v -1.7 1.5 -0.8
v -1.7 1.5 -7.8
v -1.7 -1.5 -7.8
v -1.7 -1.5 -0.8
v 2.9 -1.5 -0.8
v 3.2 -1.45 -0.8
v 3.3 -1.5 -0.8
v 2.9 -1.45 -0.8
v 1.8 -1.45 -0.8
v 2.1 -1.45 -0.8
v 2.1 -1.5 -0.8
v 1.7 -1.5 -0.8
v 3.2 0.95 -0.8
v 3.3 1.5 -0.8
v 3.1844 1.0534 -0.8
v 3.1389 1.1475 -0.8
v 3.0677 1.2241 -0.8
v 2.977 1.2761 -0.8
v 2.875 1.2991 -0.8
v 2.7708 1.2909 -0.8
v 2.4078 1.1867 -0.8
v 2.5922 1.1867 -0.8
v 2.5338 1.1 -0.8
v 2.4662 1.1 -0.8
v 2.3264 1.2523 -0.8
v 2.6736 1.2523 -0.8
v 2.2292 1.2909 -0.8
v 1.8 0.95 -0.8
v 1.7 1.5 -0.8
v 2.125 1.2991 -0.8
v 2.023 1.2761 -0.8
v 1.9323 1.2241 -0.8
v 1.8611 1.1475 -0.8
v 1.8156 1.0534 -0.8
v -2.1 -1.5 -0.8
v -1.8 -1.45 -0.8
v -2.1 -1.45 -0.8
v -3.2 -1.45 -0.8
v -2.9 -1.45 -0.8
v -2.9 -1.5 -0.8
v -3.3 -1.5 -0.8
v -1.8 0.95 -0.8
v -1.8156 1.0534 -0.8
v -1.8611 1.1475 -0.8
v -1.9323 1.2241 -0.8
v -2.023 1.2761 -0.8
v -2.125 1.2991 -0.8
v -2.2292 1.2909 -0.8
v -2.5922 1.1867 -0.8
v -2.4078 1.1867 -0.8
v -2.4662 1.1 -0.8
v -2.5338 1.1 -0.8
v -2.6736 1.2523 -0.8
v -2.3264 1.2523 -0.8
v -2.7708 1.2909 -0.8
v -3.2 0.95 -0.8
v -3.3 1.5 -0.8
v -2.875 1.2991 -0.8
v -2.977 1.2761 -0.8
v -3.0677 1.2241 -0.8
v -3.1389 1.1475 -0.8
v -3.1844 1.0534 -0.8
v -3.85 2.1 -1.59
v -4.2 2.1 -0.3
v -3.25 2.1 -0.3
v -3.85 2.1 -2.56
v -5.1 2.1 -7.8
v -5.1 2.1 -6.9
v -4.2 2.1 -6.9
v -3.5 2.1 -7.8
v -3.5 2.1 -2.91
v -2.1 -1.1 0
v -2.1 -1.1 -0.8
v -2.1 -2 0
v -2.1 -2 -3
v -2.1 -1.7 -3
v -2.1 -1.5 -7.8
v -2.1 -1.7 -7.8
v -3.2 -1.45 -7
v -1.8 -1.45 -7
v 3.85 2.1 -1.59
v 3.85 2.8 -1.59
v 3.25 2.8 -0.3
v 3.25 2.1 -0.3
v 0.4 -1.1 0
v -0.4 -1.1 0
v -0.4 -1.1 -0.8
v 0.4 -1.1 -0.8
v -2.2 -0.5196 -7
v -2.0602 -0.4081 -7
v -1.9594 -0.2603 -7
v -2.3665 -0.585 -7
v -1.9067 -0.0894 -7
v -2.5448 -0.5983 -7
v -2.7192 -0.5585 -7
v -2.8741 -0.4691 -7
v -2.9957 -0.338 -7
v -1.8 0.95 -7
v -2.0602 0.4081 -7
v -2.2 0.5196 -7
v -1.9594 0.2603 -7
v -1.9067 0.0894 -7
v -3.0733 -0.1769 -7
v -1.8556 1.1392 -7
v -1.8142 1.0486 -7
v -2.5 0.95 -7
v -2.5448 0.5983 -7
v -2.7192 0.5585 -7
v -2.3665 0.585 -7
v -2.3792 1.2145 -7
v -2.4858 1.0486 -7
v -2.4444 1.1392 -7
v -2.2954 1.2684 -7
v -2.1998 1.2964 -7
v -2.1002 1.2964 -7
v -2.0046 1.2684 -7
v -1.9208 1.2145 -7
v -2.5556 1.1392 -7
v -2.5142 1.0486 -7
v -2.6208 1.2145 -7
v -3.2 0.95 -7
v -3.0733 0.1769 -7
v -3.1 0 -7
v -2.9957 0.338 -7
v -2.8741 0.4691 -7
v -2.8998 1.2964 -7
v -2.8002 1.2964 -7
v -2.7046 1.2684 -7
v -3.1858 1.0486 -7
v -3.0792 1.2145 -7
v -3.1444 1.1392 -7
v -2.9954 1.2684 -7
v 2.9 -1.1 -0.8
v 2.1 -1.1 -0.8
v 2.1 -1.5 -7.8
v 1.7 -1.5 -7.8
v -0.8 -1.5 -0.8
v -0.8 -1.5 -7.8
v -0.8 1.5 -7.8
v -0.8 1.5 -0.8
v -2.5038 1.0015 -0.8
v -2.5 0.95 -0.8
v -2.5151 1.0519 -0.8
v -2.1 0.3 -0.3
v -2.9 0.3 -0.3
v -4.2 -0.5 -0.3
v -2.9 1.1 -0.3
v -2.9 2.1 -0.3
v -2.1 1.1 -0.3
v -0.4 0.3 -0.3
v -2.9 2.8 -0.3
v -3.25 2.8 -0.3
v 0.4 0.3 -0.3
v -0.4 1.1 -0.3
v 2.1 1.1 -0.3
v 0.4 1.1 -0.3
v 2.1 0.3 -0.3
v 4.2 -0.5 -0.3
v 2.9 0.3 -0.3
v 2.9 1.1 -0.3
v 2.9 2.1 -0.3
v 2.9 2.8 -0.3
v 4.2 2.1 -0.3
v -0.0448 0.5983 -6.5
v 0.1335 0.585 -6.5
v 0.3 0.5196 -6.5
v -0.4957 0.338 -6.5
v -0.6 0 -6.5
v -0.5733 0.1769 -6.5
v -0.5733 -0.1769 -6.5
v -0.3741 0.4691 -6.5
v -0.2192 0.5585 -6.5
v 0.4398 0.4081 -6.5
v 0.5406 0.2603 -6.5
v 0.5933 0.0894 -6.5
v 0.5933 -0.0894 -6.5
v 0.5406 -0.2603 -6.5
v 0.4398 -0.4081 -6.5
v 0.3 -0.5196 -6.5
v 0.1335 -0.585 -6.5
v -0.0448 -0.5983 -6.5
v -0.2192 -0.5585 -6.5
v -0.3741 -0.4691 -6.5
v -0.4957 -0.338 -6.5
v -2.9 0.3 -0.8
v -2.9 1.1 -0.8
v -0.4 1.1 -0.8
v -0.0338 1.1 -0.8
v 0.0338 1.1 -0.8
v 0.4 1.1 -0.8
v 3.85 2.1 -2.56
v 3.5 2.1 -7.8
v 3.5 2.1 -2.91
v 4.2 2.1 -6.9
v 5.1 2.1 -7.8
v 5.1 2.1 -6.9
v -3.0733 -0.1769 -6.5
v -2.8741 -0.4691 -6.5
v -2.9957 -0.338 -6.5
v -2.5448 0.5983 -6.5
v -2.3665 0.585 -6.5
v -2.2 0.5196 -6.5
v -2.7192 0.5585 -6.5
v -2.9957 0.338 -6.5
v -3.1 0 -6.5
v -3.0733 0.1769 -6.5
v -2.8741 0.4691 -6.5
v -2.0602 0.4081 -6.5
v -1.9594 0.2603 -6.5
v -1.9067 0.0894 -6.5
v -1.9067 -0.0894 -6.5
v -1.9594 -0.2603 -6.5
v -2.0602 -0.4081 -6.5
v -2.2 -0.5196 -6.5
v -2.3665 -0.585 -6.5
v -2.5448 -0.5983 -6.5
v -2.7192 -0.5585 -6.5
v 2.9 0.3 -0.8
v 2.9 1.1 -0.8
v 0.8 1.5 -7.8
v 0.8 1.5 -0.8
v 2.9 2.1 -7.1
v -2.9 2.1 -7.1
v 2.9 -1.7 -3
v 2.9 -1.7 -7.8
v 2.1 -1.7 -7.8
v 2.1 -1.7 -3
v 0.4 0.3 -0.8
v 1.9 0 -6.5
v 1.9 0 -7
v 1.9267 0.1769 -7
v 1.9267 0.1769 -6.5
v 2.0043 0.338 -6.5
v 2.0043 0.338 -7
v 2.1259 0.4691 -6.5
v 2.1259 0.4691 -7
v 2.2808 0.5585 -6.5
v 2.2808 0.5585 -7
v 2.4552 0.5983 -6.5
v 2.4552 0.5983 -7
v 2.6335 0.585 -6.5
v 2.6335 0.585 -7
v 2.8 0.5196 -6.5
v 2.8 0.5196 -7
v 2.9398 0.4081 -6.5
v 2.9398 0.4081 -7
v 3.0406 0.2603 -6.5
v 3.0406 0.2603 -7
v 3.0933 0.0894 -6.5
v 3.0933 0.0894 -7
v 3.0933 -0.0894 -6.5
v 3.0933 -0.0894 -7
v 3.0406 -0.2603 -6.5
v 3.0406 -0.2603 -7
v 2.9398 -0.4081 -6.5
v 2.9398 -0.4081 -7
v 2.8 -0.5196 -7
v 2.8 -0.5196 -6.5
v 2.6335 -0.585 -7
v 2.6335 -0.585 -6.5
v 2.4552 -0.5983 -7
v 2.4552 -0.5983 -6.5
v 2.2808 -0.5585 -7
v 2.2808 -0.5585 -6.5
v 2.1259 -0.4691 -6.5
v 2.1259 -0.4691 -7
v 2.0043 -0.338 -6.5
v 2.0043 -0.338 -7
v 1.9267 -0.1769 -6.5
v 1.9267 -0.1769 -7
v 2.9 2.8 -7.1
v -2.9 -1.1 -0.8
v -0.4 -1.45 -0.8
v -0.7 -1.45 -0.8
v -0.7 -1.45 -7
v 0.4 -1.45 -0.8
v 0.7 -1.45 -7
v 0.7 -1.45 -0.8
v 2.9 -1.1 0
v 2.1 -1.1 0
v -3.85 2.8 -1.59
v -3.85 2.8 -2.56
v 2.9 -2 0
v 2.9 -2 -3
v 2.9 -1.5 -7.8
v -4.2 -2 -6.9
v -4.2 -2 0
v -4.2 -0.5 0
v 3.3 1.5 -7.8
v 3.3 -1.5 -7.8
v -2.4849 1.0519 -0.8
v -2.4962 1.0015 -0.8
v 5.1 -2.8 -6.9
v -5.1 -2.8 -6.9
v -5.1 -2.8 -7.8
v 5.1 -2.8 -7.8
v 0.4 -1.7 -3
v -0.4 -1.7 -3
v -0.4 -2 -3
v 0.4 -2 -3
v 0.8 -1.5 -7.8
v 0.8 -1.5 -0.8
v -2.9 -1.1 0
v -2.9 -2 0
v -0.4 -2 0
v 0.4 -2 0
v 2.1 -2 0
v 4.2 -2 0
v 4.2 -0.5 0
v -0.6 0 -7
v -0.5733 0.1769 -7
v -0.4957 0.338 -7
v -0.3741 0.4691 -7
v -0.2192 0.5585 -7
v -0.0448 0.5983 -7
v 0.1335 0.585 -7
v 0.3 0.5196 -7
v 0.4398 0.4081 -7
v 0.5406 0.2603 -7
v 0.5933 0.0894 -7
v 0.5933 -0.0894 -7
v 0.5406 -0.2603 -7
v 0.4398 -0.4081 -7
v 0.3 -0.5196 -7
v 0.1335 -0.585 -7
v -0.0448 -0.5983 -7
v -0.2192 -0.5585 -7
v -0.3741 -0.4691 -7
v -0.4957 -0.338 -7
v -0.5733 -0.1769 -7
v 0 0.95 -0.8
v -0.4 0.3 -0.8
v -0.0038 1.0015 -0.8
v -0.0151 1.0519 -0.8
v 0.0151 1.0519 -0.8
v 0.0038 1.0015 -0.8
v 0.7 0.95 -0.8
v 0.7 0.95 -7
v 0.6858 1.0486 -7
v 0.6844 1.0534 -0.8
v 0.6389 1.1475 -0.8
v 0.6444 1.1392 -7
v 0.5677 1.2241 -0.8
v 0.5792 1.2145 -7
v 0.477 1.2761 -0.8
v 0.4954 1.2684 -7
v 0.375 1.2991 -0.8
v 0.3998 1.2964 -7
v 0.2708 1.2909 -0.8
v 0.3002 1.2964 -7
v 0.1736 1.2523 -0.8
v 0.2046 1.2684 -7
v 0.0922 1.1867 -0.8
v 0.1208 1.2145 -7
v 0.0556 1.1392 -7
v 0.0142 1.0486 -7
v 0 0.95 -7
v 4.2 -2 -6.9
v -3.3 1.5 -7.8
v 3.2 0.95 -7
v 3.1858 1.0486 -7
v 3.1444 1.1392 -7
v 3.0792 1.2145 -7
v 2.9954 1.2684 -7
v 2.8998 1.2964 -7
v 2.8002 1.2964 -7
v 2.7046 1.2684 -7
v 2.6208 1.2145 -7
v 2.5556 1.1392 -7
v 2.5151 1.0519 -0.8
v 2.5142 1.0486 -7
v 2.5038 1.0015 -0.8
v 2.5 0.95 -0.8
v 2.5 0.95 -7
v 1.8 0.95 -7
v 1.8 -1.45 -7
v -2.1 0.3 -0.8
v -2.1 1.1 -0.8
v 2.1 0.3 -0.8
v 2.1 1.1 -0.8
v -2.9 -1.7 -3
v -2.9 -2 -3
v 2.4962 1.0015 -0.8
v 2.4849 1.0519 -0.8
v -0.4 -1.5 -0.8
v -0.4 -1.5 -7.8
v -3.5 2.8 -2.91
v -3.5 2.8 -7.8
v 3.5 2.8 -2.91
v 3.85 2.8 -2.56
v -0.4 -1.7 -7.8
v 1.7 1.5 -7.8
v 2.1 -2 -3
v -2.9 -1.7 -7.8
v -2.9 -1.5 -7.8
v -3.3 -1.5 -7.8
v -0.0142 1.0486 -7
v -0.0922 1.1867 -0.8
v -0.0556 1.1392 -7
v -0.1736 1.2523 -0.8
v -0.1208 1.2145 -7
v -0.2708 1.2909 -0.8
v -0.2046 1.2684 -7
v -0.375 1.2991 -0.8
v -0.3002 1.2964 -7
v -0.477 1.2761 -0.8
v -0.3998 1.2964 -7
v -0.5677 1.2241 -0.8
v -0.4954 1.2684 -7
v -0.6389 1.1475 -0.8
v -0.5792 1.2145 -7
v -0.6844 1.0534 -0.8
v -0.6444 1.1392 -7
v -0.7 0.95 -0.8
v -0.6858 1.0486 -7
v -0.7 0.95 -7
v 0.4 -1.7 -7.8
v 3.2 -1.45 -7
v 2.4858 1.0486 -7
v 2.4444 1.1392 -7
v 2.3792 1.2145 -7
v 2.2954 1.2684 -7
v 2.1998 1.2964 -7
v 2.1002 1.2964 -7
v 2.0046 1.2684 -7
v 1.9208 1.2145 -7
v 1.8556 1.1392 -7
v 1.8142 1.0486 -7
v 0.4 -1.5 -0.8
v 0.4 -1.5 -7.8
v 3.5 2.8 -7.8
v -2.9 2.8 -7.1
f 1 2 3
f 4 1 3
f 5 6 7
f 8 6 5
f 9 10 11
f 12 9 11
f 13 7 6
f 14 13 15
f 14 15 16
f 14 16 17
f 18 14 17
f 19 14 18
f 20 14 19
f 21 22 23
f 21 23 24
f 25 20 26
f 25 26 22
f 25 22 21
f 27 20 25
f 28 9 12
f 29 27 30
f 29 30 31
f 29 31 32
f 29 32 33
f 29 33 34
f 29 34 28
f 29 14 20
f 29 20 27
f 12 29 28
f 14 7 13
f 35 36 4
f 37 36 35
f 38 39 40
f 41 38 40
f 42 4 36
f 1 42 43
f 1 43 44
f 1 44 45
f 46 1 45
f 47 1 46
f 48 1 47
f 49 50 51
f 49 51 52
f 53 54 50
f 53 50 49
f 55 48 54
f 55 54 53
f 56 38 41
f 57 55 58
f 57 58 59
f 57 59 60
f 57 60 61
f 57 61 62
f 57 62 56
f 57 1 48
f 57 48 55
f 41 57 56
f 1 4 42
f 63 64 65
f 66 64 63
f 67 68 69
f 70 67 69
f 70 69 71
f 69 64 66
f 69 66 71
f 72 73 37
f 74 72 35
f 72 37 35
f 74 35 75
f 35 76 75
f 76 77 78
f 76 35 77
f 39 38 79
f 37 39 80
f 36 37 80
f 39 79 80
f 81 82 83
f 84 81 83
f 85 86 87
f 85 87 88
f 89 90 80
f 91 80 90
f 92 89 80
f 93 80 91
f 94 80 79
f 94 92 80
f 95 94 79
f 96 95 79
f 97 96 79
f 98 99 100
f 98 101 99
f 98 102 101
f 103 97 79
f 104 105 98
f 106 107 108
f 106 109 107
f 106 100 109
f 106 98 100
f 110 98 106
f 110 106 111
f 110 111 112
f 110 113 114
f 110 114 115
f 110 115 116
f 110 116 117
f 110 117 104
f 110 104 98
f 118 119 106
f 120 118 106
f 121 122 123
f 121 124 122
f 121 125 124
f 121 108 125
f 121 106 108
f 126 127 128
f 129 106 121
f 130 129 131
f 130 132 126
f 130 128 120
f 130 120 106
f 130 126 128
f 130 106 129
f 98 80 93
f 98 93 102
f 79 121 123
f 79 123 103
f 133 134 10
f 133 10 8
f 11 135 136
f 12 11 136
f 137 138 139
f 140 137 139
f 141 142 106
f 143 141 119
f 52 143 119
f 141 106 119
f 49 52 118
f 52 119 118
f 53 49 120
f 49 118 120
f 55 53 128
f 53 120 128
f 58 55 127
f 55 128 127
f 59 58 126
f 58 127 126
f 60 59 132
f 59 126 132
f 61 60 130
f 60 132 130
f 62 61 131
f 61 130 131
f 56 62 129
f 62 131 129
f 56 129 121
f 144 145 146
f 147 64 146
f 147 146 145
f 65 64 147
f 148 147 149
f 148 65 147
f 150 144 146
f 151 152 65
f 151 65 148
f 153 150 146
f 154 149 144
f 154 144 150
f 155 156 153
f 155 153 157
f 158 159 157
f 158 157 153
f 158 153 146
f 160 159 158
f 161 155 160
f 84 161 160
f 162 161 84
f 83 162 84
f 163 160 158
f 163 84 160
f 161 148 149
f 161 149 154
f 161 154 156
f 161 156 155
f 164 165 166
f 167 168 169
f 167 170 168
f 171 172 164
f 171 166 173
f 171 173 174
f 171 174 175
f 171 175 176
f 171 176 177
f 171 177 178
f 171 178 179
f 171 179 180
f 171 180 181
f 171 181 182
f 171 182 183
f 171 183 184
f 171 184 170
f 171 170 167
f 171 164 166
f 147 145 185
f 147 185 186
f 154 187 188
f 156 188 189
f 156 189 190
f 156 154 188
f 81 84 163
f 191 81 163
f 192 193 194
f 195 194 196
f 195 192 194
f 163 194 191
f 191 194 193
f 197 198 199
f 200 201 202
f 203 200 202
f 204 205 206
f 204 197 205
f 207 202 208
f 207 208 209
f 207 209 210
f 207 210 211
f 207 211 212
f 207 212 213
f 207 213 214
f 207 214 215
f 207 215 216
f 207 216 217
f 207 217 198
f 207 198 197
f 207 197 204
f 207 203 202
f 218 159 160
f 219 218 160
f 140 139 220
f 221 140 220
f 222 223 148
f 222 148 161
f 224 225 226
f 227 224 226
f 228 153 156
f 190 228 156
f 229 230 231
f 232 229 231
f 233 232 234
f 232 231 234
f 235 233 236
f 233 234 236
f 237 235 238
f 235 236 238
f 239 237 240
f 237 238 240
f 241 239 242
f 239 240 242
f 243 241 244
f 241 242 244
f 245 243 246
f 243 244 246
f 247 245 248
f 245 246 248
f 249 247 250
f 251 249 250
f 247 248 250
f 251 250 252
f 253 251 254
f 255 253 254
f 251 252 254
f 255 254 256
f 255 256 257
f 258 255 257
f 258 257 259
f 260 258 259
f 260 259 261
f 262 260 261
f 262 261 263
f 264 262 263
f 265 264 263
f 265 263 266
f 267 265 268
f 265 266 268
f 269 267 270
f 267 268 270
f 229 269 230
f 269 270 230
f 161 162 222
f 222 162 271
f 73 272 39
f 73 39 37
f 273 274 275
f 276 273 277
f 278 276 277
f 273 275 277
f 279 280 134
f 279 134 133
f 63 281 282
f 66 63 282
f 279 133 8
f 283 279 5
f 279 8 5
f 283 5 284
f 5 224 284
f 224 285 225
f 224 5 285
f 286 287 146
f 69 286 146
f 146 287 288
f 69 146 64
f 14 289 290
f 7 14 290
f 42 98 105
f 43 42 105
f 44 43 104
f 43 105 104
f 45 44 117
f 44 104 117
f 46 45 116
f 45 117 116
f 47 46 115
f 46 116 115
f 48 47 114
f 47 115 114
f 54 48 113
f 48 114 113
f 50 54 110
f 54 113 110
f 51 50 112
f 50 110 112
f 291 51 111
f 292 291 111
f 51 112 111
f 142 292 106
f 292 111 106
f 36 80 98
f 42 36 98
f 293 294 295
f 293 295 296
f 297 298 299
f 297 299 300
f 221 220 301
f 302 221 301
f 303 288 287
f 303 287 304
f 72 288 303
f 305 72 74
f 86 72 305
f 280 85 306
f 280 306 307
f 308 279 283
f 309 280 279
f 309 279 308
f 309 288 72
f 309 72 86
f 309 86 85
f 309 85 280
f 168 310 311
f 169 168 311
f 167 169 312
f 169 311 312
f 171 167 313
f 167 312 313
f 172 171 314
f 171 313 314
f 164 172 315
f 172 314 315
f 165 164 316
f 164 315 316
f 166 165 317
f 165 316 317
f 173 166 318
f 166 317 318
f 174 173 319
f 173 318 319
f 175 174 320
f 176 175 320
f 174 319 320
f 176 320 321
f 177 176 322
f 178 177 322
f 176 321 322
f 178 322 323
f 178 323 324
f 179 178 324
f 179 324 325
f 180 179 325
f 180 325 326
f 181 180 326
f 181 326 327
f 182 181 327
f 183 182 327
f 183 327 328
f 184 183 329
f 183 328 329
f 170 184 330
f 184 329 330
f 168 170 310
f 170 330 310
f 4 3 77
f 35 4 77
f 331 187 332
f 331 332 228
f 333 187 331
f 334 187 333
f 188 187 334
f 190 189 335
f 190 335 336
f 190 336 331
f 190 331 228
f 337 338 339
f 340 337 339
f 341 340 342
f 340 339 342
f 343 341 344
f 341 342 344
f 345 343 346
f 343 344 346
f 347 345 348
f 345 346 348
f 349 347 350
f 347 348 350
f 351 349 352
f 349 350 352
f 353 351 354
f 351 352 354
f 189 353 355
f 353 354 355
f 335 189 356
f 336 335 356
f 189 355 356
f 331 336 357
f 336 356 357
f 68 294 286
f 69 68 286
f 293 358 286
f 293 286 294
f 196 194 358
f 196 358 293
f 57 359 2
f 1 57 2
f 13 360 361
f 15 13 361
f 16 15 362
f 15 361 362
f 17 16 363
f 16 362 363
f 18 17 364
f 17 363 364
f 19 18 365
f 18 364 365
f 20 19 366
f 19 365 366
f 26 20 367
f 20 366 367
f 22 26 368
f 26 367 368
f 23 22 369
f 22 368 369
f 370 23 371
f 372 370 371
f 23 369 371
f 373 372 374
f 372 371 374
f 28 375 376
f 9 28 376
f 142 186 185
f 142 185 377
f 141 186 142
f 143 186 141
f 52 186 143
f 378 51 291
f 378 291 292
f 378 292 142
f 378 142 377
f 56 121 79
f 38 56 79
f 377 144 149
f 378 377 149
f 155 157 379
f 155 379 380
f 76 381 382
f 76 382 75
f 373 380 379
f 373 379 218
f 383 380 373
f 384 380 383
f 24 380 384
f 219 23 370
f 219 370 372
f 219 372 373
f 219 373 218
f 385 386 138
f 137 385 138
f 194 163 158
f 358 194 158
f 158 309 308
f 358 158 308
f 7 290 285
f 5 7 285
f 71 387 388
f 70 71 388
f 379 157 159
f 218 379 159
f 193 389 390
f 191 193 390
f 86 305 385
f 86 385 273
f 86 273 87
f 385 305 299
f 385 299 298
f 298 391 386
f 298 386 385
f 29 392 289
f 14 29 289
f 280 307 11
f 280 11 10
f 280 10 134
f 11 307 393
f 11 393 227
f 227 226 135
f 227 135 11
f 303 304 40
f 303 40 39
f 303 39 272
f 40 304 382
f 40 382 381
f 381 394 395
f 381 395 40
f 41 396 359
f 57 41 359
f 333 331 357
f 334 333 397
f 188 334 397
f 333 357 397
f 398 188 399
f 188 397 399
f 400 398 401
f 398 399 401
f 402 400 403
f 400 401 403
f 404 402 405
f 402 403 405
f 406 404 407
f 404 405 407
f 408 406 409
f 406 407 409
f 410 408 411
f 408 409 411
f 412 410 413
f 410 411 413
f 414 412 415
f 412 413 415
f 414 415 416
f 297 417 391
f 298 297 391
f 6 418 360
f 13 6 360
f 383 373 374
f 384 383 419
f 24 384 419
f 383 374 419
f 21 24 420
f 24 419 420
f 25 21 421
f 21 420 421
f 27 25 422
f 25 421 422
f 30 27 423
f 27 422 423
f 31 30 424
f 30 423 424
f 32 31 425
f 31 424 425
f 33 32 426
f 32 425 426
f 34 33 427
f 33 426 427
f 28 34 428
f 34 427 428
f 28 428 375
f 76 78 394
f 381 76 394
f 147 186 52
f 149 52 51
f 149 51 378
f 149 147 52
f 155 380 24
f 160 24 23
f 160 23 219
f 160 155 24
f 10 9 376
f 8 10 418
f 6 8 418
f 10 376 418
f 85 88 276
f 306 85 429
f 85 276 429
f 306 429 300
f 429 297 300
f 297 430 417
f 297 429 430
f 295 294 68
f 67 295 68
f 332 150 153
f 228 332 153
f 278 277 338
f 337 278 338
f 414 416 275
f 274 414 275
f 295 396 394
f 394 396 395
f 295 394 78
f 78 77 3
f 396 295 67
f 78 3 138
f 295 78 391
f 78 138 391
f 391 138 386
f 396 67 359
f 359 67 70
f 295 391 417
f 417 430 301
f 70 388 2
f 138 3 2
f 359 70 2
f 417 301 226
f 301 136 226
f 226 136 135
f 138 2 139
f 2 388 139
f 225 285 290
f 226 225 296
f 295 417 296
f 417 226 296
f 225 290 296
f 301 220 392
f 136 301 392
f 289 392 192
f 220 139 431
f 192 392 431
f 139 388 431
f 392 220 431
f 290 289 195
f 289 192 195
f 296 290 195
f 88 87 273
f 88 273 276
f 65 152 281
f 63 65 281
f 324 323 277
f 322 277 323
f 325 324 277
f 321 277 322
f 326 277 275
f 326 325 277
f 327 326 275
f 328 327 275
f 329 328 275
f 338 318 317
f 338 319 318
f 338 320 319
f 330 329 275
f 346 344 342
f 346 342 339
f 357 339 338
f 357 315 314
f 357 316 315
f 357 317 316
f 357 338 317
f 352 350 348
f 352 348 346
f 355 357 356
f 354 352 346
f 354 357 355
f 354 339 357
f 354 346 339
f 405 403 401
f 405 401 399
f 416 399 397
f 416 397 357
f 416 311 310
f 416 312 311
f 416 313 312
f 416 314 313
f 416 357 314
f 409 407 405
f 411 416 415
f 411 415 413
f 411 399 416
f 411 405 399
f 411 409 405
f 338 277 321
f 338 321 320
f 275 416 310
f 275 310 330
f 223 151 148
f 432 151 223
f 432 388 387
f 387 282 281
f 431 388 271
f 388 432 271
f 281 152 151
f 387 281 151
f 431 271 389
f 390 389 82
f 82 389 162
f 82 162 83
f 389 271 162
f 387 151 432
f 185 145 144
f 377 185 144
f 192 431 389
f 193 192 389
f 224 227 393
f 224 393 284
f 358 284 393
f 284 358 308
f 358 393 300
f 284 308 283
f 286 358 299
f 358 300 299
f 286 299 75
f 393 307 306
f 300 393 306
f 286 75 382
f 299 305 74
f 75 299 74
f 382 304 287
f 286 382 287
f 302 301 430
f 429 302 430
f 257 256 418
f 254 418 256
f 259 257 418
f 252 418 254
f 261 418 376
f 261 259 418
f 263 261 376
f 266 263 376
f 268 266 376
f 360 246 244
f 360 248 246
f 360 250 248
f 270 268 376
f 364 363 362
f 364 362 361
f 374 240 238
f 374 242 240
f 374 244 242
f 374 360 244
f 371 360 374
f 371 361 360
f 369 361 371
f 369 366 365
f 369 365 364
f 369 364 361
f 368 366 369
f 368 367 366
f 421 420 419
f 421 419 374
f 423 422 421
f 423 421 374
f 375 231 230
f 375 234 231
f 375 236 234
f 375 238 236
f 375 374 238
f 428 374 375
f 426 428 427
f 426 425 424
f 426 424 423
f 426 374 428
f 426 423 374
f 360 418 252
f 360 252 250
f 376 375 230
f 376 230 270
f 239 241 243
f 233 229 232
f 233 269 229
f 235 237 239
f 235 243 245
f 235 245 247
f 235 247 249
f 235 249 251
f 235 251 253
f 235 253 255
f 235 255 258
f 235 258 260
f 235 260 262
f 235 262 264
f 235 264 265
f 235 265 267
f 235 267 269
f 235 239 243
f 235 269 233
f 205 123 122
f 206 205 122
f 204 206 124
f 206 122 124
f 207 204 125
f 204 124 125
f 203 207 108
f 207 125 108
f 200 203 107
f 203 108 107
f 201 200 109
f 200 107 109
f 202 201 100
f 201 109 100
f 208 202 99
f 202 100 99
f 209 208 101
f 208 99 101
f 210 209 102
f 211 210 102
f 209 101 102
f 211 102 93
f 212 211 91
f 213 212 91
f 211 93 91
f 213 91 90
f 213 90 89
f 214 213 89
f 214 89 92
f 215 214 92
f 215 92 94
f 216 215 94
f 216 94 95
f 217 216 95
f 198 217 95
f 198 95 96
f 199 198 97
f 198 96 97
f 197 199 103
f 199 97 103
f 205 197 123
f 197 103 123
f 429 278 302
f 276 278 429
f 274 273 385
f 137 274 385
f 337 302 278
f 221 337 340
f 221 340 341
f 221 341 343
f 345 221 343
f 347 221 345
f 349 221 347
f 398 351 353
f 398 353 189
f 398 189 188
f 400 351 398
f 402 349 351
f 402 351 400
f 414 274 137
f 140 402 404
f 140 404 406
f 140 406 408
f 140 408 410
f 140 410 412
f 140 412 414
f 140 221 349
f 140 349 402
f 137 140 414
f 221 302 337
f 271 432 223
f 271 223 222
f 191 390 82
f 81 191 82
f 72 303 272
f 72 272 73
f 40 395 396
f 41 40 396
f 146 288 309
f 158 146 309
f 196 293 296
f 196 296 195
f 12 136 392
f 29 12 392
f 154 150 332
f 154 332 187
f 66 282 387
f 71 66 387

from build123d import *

# Parameters (mm, degrees)
ESQUISSE1_W             = 10.2
ESQUISSE1_H             = 5.6
BOSS_EXTRU_1_DEPTH      = 7.8
ESQUISSE2_W             = 10.2
ESQUISSE2_H             = 3.3
ENL_V_MAT_EXTRU_1_DEPTH = 0.3
ESQUISSE4_W             = 0.9
ESQUISSE4_H             = 3.3
ENL_V_MAT_EXTRU_2_DEPTH = 6.9
ESQUISSE5_W             = 5.8
ESQUISSE5_H             = 6.8
ENL_V_MAT_EXTRU_3_DEPTH = 0.7
ESQUISSE6_W             = 0.8
ESQUISSE6_H             = 0.9
ENL_V_MAT_EXTRU_4_DEPTH = 0.8
ESQUISSE7_W             = 0.8
ESQUISSE7_H             = 0.8
ENL_V_MAT_EXTRU_5_DEPTH = 0.5
ENL_V_MAT_EXTRU_6_DEPTH = 7
ENL_V_MAT_EXTRU_7_DEPTH = 0.8
ESQUISSE10_R            = 0.6
ENL_V_MAT_EXTRU_8_DEPTH = 0.5
ESQUISSE11_W            = 0.8
ESQUISSE11_H            = 0.3
ENL_V_MAT_EXTRU_9_DEPTH = 2.2


with BuildPart() as part:
    # Esquisse1 → Boss.-Extru.1 (new body)
    with BuildSketch(Plane.XY):
        Rectangle(ESQUISSE1_W, ESQUISSE1_H)
    extrude(amount=-BOSS_EXTRU_1_DEPTH)

    # Esquisse2 → Enlèv. mat.-Extru.1 (cut)
    with BuildSketch(Plane.XY):
        with Locations((0, 1.15)):
            Rectangle(ESQUISSE2_W, ESQUISSE2_H)
    extrude(amount=-ENL_V_MAT_EXTRU_1_DEPTH, mode=Mode.SUBTRACT)

    # Esquisse4 → Enlèv. mat.-Extru.2 (cut)
    with BuildSketch(Plane.XY):
        with Locations((-4.65, 1.15)):
            Rectangle(ESQUISSE4_W, ESQUISSE4_H)
        Polygon((5.1, -2.8), (5.1, -0.5), (4.2, -0.5), (4.2, -2), (-4.2, -2), (-4.2, -0.5), (-5.1, -0.5), (-5.1, -2.8), align=None)
        with Locations((4.65, 1.15)):
            Rectangle(ESQUISSE4_W, ESQUISSE4_H)
    extrude(amount=-ENL_V_MAT_EXTRU_2_DEPTH, mode=Mode.SUBTRACT)

    # Esquisse5 → Enlèv. mat.-Extru.3 (cut)
    with BuildSketch(Plane(origin=(0, 2.8, 0), x_dir=(1, 0, 0), z_dir=(0, 1, 0))):
        Polygon((-3.5, 2.91), (-3.5, 7.8), (-5.1, 7.8), (-5.1, 6.9), (-4.2, 6.9), (-4.2, 0.3), (-3.25, 0.3), (-3.85, 1.59), (-3.85, 2.56), align=None)
        Polygon((5.1, 7.8), (3.5, 7.8), (3.5, 2.91), (3.85, 2.56), (3.85, 1.59), (3.25, 0.3), (4.2, 0.3), (4.2, 6.9), (5.1, 6.9), align=None)
        with Locations((0, 3.7)):
            Rectangle(ESQUISSE5_W, ESQUISSE5_H)
    extrude(amount=-ENL_V_MAT_EXTRU_3_DEPTH, mode=Mode.SUBTRACT)

    # Esquisse6 → Enlèv. mat.-Extru.4 (cut)
    with BuildSketch(Plane.XY):
        with Locations((-2.5, -1.55)):
            Rectangle(ESQUISSE6_W, ESQUISSE6_H)
        with Locations((0, -1.55)):
            Rectangle(ESQUISSE6_W, ESQUISSE6_H)
        with Locations((2.5, -1.55)):
            Rectangle(ESQUISSE6_W, ESQUISSE6_H)
    extrude(amount=-ENL_V_MAT_EXTRU_4_DEPTH, mode=Mode.SUBTRACT)

    # Esquisse7 → Enlèv. mat.-Extru.5 (cut)
    with BuildSketch(Plane.XY.offset(-0.3)):
        with Locations((-2.5, 0.7)):
            Rectangle(ESQUISSE7_W, ESQUISSE7_H)
        with Locations((0, 0.7)):
            Rectangle(ESQUISSE7_W, ESQUISSE7_H)
        with Locations((2.5, 0.7)):
            Rectangle(ESQUISSE7_W, ESQUISSE7_H)
    extrude(amount=-ENL_V_MAT_EXTRU_5_DEPTH, mode=Mode.SUBTRACT)

    # Esquisse8 → Enlèv. mat.-Extru.6 (cut)
    with BuildSketch(Plane(origin=(0, 0, -7.8), x_dir=(-1, 0, 0), z_dir=(0, 0, -1))):
        Polygon((0.4, -1.5), (0.8, -1.5), (0.8, 1.5), (-0.8, 1.5), (-0.8, -1.5), (-0.4, -1.5), (-0.4, -1.7), (0.4, -1.7), align=None)
        with BuildLine():
            ThreePointArc((-0.7, 0.95), (-0.35, 1.3), (0, 0.95))
            ThreePointArc((0, 0.95), (0.35, 1.3), (0.7, 0.95))
            Line((0.7, 0.95), (0.7, -1.45))
            Line((0.7, -1.45), (-0.7, -1.45))
            Line((-0.7, -1.45), (-0.7, 0.95))
        make_face(mode=Mode.SUBTRACT)
        Polygon((-2.1, -1.5), (-1.7, -1.5), (-1.7, 1.5), (-3.3, 1.5), (-3.3, -1.5), (-2.9, -1.5), (-2.9, -1.7), (-2.1, -1.7), align=None)
        with BuildLine():
            ThreePointArc((-3.2, 0.95), (-2.85, 1.3), (-2.5, 0.95))
            ThreePointArc((-2.5, 0.95), (-2.15, 1.3), (-1.8, 0.95))
            Line((-1.8, 0.95), (-1.8, -1.45))
            Line((-1.8, -1.45), (-3.2, -1.45))
            Line((-3.2, -1.45), (-3.2, 0.95))
        make_face(mode=Mode.SUBTRACT)
        Polygon((2.9, -1.5), (3.3, -1.5), (3.3, 1.5), (1.7, 1.5), (1.7, -1.5), (2.1, -1.5), (2.1, -1.7), (2.9, -1.7), align=None)
        with BuildLine():
            ThreePointArc((1.8, 0.95), (2.15, 1.3), (2.5, 0.95))
            ThreePointArc((2.5, 0.95), (2.85, 1.3), (3.2, 0.95))
            Line((3.2, 0.95), (3.2, -1.45))
            Line((3.2, -1.45), (1.8, -1.45))
            Line((1.8, -1.45), (1.8, 0.95))
        make_face(mode=Mode.SUBTRACT)
    extrude(amount=-ENL_V_MAT_EXTRU_6_DEPTH, mode=Mode.SUBTRACT)

    # Esquisse9 → Enlèv. mat.-Extru.7 (cut)
    with BuildSketch(Plane(origin=(0, 0, -7.8), x_dir=(-1, 0, 0), z_dir=(0, 0, -1))):
        with BuildLine():
            Line((-0.7, 0.95), (-0.7, -1.45))
            Line((-0.7, -1.45), (0.7, -1.45))
            Line((0.7, -1.45), (0.7, 0.95))
            ThreePointArc((0.7, 0.95), (0.35, 1.3), (0, 0.95))
            ThreePointArc((0, 0.95), (-0.35, 1.3), (-0.7, 0.95))
        make_face()
        with BuildLine():
            Line((-3.2, 0.95), (-3.2, -1.45))
            Line((-3.2, -1.45), (-1.8, -1.45))
            Line((-1.8, -1.45), (-1.8, 0.95))
            ThreePointArc((-1.8, 0.95), (-2.15, 1.3), (-2.5, 0.95))
            ThreePointArc((-2.5, 0.95), (-2.85, 1.3), (-3.2, 0.95))
        make_face()
        with BuildLine():
            Line((1.8, 0.95), (1.8, -1.45))
            Line((1.8, -1.45), (3.2, -1.45))
            Line((3.2, -1.45), (3.2, 0.95))
            ThreePointArc((3.2, 0.95), (2.85, 1.3), (2.5, 0.95))
            ThreePointArc((2.5, 0.95), (2.15, 1.3), (1.8, 0.95))
        make_face()
    extrude(amount=-ENL_V_MAT_EXTRU_7_DEPTH, mode=Mode.SUBTRACT)

    # Esquisse10 → Enlèv. mat.-Extru.8 (cut)
    with BuildSketch(Plane(origin=(0, 0, -7), x_dir=(-1, 0, 0), z_dir=(0, 0, -1))):
        Circle(ESQUISSE10_R)
        with Locations((-2.5, 0)):
            Circle(ESQUISSE10_R)
        with Locations((2.5, 0)):
            Circle(ESQUISSE10_R)
    extrude(amount=-ENL_V_MAT_EXTRU_8_DEPTH, mode=Mode.SUBTRACT)

    # Esquisse11 → Enlèv. mat.-Extru.9 (cut)
    with BuildSketch(Plane.XY.offset(-0.8)):
        with Locations((-2.5, -1.85)):
            Rectangle(ESQUISSE11_W, ESQUISSE11_H)
        with Locations((0, -1.85)):
            Rectangle(ESQUISSE11_W, ESQUISSE11_H)
        with Locations((2.5, -1.85)):
            Rectangle(ESQUISSE11_W, ESQUISSE11_H)
    extrude(amount=-ENL_V_MAT_EXTRU_9_DEPTH, mode=Mode.SUBTRACT)


solid = part.part
